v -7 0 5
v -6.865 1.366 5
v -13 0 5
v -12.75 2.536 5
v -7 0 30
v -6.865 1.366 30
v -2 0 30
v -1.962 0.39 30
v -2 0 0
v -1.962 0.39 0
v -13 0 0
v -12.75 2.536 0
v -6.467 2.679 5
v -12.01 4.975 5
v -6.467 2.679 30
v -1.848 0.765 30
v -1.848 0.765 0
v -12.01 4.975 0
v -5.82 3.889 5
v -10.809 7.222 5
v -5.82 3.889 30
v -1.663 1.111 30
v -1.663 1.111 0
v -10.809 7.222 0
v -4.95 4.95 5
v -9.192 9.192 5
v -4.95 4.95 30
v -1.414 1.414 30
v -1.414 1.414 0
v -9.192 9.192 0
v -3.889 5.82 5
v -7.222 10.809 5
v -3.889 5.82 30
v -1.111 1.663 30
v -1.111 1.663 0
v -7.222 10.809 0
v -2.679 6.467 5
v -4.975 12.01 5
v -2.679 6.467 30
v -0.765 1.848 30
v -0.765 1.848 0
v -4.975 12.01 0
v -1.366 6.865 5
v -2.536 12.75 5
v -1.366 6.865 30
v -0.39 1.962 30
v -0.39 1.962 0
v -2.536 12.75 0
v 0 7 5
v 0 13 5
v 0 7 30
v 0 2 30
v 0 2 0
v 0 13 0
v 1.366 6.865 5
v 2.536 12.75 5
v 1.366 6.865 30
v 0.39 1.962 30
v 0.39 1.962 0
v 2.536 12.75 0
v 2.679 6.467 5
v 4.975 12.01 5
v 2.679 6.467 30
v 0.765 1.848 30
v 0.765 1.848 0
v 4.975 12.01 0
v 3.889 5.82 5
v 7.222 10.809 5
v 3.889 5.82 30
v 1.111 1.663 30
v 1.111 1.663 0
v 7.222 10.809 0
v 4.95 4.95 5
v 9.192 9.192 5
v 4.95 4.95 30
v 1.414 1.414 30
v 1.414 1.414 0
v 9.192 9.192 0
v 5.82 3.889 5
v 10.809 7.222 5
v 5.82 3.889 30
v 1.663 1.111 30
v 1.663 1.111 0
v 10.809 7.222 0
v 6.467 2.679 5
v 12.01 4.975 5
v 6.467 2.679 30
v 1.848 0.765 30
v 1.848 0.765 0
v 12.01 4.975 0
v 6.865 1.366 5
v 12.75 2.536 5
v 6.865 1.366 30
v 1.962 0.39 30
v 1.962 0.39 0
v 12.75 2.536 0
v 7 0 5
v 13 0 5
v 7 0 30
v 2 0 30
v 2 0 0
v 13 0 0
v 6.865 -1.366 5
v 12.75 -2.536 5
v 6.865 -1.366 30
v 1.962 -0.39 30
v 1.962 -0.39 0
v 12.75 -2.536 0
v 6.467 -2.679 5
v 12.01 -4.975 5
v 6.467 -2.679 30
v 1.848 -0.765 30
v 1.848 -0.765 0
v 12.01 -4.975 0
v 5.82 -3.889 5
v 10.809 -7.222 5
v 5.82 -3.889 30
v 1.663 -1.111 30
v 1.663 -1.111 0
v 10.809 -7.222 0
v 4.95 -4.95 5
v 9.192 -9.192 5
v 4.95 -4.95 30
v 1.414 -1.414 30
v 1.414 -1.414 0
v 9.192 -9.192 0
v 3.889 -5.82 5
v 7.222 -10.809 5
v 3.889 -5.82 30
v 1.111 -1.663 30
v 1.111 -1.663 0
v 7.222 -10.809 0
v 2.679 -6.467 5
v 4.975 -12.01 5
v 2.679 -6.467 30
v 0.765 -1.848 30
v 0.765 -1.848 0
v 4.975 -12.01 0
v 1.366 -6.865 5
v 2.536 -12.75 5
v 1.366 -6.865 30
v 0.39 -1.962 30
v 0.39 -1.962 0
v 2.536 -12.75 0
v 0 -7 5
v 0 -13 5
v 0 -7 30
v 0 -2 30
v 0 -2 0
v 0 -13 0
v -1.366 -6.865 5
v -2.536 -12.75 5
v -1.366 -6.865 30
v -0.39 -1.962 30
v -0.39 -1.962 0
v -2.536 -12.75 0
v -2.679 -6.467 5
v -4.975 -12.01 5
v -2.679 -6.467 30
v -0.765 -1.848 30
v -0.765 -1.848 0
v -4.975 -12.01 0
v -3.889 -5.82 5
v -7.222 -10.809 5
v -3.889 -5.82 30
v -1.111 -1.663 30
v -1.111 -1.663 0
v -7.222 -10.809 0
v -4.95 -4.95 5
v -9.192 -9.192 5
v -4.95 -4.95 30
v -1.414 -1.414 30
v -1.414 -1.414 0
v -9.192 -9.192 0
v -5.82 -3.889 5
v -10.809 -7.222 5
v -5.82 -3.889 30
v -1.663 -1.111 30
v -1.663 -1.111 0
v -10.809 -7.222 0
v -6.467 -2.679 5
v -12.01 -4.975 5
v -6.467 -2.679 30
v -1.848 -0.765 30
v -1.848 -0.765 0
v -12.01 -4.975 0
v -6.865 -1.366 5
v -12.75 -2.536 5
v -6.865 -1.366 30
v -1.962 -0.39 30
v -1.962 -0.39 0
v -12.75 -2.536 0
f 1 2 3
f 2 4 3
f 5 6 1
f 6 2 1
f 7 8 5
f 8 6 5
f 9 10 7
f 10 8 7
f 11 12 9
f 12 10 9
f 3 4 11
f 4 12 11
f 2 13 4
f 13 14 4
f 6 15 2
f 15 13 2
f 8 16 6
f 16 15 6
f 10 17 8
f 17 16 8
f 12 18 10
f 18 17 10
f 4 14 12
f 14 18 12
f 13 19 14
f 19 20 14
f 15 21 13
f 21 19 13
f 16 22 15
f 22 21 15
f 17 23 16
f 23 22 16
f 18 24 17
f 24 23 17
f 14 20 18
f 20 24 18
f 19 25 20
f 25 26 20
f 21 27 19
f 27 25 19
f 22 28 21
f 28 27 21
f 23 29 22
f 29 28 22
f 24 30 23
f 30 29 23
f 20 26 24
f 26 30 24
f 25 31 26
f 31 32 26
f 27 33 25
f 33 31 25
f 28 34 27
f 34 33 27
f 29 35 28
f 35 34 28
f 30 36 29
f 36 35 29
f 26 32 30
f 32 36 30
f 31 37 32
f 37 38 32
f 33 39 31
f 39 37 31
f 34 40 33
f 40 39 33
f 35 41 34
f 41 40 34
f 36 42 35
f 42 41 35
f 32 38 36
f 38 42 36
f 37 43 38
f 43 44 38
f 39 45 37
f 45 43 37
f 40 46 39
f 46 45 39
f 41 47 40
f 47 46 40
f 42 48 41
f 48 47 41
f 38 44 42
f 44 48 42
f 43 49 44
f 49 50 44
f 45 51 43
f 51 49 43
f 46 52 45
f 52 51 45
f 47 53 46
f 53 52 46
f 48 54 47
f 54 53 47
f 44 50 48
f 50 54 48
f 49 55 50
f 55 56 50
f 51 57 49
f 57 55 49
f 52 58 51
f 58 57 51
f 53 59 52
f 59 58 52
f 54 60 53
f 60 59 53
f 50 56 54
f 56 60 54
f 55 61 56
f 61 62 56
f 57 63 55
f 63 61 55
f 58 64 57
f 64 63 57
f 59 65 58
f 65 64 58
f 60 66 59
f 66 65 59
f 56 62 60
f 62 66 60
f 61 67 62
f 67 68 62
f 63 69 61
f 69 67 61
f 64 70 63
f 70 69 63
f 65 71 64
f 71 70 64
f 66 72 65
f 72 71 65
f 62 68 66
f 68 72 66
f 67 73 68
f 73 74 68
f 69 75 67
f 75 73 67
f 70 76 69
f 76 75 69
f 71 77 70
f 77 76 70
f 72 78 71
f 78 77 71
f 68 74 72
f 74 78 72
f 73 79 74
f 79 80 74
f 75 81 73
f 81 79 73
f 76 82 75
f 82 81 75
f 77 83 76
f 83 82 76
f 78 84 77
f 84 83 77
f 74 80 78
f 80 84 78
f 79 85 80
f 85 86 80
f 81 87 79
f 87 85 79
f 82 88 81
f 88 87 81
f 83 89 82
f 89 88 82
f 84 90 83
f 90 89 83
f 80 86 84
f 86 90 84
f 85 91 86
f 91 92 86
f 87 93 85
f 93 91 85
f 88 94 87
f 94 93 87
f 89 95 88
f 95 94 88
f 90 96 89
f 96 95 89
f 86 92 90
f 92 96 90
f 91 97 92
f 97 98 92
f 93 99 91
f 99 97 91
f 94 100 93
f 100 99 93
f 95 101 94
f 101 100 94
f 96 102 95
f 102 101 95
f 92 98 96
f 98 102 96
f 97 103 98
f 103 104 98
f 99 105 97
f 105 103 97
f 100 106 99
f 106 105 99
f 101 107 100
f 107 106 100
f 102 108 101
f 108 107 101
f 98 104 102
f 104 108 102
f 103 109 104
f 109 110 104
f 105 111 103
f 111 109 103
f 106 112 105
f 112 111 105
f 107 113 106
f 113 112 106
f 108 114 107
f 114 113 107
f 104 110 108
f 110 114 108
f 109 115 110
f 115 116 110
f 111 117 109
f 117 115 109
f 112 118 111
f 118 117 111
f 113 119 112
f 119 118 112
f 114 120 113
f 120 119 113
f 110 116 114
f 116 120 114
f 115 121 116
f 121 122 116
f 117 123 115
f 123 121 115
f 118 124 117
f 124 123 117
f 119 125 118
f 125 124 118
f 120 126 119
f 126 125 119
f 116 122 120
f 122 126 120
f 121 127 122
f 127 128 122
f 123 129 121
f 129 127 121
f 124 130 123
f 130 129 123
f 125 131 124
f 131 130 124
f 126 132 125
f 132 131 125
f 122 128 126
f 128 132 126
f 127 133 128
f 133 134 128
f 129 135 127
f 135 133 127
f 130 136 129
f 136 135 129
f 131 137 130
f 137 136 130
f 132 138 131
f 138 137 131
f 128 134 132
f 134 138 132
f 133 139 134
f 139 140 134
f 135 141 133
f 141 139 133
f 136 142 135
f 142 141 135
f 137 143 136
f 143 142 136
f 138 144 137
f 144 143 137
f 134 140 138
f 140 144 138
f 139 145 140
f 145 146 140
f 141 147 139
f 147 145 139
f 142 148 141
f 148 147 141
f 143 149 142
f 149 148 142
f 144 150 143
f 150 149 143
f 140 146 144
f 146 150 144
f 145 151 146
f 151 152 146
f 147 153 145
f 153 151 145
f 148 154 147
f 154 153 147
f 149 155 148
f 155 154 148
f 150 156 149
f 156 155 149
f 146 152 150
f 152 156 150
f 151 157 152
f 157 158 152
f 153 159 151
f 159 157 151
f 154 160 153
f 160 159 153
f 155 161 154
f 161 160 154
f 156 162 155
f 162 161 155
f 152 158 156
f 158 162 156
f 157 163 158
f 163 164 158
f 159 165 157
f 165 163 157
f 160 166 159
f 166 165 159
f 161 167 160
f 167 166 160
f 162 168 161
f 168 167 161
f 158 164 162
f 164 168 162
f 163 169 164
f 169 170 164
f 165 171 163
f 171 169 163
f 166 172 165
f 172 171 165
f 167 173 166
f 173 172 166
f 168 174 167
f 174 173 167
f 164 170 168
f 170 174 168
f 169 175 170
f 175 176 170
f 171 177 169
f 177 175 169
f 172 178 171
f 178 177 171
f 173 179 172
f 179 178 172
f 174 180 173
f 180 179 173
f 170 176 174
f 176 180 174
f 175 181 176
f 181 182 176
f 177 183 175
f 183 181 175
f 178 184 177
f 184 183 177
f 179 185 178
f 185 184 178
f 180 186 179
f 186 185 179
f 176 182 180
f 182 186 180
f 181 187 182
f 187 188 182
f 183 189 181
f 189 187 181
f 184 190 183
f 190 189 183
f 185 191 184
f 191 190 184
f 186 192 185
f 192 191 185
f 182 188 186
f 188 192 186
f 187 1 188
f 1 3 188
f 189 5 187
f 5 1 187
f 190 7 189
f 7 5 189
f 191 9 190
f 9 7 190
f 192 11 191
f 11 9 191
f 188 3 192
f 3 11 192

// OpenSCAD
$fn = 32;

// ----------------------------------------------------------------------
// Profiled standoff: flanged spacer, 30 mm long, bore 4 mm
// ----------------------------------------------------------------------

// --- parameters (mm) ---
revolve_angle = 360;      // full turn around the Z axis
profile_points = 6;       // points of the closed outline

profile = [[2, 0], [13, 0], [13, 5], [7, 5], [7, 30], [2, 30]];  // single closed polygon, 6 points, counter clockwise

// --- the one profile operation ---
rotate_extrude(angle = revolve_angle) polygon(points = profile);
